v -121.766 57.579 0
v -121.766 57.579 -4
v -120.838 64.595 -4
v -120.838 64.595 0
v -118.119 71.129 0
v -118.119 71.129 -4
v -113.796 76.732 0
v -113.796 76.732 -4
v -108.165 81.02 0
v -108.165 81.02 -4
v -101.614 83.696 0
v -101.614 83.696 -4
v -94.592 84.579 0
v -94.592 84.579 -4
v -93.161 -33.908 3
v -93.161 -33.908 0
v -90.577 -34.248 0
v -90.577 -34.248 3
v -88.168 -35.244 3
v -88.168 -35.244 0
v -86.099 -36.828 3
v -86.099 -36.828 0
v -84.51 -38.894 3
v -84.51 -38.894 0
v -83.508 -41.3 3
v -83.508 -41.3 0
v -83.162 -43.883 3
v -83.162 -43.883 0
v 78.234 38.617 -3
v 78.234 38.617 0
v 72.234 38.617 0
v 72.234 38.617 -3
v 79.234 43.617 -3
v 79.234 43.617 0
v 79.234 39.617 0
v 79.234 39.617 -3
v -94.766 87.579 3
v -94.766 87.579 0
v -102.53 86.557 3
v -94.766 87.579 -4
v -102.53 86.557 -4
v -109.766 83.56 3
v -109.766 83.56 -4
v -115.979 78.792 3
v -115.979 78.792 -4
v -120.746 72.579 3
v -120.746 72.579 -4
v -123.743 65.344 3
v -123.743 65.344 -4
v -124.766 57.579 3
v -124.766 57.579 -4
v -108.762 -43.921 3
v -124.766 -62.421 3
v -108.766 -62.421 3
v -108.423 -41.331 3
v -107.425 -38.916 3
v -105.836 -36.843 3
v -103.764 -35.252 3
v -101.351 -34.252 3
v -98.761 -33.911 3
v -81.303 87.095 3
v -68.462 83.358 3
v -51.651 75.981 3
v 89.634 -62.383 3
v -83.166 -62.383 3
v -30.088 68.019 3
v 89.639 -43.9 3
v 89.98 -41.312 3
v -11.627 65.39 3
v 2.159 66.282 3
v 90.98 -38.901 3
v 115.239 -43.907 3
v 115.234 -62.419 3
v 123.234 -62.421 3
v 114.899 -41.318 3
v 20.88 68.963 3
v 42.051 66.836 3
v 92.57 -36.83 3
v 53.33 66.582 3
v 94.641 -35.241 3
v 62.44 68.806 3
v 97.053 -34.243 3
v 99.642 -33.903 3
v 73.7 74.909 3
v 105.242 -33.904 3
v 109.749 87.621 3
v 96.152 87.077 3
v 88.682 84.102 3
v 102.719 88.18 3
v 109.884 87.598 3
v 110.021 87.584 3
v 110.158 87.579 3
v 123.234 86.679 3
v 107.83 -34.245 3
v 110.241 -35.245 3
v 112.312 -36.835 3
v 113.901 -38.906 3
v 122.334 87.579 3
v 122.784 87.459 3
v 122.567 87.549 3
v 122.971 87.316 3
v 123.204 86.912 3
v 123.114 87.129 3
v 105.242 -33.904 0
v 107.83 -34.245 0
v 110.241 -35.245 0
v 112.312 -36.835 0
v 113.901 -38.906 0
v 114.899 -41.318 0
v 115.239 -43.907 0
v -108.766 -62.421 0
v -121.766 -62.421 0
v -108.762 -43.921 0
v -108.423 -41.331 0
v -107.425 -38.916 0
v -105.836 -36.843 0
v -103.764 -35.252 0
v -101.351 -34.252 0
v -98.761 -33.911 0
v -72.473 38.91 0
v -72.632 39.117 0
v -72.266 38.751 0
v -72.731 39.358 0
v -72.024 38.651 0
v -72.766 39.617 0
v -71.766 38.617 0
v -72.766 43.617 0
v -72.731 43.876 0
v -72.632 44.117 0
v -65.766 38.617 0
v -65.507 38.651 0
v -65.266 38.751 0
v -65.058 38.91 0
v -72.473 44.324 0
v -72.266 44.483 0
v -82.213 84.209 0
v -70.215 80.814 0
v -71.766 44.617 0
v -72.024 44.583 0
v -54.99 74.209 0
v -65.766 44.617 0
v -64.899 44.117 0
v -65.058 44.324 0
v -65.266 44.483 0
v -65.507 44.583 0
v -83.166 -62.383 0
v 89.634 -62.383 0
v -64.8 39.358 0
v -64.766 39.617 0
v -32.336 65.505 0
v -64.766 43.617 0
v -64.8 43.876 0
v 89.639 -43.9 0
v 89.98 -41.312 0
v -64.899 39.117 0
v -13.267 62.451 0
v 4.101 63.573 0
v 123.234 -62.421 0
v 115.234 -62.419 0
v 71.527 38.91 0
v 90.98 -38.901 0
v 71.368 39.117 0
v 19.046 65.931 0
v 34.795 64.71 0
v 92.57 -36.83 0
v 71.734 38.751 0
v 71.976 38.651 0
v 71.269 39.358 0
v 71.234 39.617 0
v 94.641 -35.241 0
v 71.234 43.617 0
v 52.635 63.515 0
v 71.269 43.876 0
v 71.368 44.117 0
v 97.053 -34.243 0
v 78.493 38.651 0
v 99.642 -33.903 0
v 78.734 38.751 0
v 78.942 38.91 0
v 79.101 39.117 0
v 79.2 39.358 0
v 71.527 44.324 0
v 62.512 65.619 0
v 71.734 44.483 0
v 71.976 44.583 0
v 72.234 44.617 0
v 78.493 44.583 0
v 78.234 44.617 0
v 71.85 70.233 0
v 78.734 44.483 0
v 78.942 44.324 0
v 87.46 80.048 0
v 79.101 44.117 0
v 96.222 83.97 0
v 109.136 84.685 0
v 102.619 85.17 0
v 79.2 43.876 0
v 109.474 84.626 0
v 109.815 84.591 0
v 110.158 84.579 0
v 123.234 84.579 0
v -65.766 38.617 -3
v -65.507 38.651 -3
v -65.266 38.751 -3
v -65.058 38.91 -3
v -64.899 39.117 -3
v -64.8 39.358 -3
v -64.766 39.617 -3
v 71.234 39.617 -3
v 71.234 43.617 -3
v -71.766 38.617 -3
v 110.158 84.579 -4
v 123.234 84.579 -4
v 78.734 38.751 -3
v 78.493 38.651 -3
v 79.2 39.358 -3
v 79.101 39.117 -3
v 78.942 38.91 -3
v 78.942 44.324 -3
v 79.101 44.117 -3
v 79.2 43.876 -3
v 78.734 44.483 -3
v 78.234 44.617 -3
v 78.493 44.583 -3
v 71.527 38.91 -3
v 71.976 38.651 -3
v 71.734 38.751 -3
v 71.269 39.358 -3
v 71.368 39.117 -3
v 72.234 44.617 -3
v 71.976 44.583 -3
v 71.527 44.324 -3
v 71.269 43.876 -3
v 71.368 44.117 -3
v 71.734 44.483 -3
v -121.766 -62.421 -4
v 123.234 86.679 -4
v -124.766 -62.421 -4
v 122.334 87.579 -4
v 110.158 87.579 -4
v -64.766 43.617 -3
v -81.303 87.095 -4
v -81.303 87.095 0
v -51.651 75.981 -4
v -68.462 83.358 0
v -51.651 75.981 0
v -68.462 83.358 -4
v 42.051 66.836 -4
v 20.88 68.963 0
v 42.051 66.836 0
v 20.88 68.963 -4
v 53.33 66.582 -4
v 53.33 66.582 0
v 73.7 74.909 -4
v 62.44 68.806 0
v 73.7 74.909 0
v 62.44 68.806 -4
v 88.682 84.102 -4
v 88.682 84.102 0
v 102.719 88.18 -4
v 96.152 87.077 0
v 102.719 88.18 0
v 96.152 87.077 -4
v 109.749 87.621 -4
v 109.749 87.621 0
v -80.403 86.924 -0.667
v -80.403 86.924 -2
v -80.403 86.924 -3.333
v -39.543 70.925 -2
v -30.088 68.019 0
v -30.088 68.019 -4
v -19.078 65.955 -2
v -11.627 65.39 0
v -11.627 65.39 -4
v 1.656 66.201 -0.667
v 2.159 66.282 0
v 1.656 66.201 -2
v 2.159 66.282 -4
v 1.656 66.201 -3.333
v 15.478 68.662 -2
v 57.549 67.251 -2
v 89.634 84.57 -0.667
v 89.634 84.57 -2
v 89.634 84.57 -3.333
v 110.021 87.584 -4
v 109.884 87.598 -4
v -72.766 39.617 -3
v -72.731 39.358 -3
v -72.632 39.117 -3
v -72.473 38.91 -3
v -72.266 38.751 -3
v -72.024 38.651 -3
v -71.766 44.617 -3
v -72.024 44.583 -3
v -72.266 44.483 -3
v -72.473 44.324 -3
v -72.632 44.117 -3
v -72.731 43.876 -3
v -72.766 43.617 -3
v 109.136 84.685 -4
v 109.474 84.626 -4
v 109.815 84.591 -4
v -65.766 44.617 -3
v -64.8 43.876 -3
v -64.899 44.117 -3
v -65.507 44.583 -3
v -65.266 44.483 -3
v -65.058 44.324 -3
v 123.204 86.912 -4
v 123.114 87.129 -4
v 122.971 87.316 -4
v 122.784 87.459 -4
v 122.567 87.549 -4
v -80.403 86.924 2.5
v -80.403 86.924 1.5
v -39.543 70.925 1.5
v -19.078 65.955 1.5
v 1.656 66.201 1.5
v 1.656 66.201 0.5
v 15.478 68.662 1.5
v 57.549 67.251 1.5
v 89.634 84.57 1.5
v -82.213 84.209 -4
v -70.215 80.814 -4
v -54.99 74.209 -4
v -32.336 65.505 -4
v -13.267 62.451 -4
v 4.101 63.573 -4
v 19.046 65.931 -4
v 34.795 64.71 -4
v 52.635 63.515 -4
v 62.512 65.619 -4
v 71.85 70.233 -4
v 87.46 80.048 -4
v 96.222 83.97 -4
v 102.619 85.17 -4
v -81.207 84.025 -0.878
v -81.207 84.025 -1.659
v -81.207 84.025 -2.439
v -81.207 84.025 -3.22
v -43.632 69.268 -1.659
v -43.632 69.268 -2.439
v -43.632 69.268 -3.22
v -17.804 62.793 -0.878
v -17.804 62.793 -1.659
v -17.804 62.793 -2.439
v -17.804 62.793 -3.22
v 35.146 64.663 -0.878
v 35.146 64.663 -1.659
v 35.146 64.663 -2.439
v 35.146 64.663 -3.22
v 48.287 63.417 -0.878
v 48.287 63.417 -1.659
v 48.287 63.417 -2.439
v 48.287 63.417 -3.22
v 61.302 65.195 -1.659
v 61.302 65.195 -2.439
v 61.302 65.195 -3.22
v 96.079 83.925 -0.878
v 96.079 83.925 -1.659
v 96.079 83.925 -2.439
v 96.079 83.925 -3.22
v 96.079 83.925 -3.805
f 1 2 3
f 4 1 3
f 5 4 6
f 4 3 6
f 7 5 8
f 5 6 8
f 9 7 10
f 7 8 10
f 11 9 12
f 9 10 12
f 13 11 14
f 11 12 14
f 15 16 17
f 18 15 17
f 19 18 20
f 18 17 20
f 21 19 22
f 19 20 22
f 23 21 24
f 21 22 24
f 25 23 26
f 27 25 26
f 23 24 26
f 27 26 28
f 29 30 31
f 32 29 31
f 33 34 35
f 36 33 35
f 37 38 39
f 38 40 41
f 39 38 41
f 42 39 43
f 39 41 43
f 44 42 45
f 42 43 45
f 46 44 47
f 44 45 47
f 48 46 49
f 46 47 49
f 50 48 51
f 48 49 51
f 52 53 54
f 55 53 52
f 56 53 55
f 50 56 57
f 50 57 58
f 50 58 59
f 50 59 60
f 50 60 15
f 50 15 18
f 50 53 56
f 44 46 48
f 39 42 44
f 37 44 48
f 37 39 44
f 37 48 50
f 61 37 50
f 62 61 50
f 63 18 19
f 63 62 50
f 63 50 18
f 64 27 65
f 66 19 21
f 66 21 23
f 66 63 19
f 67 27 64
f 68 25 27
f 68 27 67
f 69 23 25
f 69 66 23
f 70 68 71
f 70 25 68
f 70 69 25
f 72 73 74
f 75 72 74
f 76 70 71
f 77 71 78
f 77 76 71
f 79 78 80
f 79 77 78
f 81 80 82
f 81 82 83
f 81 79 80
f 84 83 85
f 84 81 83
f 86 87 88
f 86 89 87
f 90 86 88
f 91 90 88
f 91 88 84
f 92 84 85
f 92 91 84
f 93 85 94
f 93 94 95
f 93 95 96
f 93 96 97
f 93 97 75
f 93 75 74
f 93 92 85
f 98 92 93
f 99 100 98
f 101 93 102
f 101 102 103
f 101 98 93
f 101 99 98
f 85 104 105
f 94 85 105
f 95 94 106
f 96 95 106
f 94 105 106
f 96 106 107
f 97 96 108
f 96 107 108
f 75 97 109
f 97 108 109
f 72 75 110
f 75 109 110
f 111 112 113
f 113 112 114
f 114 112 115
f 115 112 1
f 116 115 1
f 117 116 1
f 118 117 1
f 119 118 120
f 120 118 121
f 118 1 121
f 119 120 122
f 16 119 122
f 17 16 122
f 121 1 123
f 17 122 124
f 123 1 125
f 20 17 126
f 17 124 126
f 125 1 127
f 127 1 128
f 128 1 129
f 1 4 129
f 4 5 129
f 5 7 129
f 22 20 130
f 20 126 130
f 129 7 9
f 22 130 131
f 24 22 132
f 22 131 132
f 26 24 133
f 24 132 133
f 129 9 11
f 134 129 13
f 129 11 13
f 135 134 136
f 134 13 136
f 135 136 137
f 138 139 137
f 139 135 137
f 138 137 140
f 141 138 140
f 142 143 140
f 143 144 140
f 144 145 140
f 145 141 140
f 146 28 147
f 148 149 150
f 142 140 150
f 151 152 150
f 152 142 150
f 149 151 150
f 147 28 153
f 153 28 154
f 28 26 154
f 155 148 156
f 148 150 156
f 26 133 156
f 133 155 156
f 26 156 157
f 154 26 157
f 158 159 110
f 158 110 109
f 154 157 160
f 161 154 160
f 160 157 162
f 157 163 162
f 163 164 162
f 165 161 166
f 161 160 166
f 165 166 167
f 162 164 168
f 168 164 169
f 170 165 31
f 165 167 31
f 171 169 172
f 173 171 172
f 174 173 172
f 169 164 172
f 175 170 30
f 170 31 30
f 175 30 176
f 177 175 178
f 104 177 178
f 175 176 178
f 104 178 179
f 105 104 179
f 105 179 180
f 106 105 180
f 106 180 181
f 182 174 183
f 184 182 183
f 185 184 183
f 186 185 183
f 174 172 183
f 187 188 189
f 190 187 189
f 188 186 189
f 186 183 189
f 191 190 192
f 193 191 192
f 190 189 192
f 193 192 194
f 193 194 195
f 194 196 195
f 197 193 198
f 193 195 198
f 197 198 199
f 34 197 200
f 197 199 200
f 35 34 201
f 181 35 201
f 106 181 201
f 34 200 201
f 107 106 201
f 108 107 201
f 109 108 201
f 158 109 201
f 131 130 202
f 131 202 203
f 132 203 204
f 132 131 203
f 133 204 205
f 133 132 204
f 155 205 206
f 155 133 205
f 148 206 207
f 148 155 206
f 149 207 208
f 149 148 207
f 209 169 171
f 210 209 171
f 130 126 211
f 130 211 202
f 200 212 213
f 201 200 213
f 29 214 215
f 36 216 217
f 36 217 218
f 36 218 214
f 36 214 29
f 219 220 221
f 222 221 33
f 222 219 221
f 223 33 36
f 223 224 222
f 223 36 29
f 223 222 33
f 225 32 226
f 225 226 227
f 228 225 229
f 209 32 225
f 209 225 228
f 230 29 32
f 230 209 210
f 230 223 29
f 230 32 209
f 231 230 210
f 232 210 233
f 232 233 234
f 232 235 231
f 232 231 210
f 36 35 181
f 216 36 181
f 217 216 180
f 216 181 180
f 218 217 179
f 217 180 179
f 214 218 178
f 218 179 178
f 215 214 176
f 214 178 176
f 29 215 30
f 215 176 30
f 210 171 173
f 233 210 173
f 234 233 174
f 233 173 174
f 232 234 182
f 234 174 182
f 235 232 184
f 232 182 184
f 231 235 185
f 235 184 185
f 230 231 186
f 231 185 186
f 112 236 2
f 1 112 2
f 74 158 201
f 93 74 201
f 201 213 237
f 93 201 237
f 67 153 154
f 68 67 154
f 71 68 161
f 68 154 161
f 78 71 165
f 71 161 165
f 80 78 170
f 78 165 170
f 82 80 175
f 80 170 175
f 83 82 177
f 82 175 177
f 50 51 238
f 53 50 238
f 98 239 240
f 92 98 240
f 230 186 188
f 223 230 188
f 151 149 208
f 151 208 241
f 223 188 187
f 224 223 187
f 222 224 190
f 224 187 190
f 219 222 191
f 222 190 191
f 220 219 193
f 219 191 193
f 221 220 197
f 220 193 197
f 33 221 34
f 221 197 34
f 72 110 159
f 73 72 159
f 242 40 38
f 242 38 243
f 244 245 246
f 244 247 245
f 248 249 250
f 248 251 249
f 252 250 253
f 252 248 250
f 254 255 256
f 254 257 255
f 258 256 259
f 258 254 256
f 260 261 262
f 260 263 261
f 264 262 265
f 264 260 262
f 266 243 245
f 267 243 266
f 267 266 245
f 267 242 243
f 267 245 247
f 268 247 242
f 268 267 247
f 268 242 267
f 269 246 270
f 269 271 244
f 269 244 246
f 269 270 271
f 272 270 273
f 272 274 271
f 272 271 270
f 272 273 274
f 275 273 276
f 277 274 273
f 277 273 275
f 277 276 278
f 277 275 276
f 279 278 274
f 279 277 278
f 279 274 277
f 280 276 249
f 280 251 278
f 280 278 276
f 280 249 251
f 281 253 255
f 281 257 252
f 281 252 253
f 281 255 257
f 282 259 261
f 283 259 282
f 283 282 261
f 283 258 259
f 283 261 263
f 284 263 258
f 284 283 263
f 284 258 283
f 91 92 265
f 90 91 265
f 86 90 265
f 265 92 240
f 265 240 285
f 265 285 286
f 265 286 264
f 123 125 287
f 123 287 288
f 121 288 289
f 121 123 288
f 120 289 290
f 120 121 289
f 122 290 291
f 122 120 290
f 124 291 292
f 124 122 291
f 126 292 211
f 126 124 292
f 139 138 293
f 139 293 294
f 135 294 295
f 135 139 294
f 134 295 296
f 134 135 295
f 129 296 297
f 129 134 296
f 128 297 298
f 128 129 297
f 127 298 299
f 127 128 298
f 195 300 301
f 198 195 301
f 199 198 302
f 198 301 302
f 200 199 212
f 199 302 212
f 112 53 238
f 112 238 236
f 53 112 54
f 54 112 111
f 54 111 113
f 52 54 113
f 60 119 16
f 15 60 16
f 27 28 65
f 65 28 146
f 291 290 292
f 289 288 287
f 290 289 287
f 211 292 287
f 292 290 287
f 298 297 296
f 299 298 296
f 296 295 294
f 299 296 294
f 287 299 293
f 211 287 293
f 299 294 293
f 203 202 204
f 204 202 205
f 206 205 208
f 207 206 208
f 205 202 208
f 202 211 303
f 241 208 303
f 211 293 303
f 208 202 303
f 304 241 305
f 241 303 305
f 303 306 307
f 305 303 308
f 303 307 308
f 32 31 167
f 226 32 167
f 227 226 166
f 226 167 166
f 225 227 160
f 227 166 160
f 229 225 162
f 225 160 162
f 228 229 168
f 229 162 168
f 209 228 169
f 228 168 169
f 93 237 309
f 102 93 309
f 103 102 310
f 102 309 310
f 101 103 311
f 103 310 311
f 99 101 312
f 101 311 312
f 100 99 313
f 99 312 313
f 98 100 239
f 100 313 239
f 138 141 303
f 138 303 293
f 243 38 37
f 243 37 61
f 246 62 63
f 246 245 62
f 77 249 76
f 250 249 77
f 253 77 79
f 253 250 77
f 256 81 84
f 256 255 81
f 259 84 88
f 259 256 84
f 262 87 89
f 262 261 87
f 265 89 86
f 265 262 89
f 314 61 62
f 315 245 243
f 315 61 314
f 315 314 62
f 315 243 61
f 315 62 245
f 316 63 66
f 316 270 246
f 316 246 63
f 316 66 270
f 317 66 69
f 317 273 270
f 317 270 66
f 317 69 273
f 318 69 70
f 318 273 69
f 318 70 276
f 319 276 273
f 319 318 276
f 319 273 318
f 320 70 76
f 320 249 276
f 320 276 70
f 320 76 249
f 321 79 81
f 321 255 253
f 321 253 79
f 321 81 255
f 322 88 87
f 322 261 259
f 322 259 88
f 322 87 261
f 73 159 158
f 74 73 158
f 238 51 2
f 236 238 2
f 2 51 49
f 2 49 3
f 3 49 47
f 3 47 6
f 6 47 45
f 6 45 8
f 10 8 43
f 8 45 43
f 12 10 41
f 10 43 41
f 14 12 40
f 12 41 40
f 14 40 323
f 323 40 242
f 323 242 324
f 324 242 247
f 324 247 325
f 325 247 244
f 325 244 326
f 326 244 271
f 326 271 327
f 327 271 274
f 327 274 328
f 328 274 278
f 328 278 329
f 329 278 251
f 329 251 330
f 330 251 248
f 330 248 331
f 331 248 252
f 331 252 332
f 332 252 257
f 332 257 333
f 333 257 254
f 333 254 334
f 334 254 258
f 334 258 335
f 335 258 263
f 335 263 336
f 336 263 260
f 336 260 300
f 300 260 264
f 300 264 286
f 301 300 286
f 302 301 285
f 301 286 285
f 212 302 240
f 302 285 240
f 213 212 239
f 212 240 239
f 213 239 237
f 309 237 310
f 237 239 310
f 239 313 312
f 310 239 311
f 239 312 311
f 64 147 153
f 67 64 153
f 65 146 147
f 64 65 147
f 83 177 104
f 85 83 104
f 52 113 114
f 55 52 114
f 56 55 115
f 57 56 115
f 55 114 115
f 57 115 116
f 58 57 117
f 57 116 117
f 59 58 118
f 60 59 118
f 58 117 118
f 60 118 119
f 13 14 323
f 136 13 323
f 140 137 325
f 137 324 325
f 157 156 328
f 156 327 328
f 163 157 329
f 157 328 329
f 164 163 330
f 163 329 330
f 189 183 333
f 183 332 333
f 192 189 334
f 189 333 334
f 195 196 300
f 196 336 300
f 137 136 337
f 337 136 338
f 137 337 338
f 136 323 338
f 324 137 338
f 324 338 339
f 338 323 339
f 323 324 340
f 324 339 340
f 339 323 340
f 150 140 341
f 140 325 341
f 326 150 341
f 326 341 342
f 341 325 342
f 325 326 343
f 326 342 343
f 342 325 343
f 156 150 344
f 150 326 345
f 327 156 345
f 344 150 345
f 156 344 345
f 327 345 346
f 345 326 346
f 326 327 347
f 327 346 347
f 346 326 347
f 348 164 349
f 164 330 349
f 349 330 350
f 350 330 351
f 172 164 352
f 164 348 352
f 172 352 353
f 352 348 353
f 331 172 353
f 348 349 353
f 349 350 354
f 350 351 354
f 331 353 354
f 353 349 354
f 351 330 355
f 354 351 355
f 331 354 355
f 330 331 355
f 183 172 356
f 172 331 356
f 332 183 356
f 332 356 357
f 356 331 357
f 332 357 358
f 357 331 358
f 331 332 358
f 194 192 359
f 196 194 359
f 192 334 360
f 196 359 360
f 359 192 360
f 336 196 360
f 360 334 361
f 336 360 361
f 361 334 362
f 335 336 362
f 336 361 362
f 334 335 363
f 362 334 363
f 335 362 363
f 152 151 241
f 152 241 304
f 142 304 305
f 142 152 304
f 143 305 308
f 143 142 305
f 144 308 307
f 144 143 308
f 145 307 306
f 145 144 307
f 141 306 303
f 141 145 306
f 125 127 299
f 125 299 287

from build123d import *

# Parameters (mm, degrees)
BOSS_EXTRUDE1_DEPTH = 3
BOSS_EXTRUDE2_DEPTH = 3
BOSS_EXTRUDE5_START = 4
BOSS_EXTRUDE5_DEPTH = 4


with BuildPart() as part:
    # Sketch1 → Boss-Extrude1 (new body)
    with BuildSketch(Plane.XY):
        with BuildLine():
            Line((-124.765521303, -62.420756715), (-108.765521303, -62.420756715))
            Line((-108.765521303, -62.420756715), (-108.761709468, -43.920757107))
            ThreePointArc((-108.761709468, -43.920757107), (-105.835782296, -36.843166813), (-98.760678208, -33.911232925))
            Line((-98.760678208, -33.911232925), (-93.160679046, -33.908168006))
            ThreePointArc((-93.160679046, -33.908168006), (-86.099239047, -36.828472645), (-83.161701095, -43.882761045))
            Line((-83.161701095, -43.882761045), (-83.165512931, -62.382760652))
            Line((-83.165512931, -62.382760652), (89.634487069, -62.382760652))
            Line((89.634487069, -62.382760652), (89.639059879, -43.900228298))
            ThreePointArc((89.639059879, -43.900228298), (92.569741149, -36.829885233), (99.641533275, -33.902702306))
            Line((99.641533275, -33.902702306), (105.241533104, -33.904087579))
            ThreePointArc((105.241533104, -33.904087579), (112.311876169, -36.834768849), (115.239059096, -43.906560975))
            Line((115.239059096, -43.906560975), (115.234478942, -62.418777415))
            Line((115.234478942, -62.418777415), (123.234478697, -62.420756715))
            Line((123.234478697, -62.420756715), (123.234478697, 86.679243285))
            ThreePointArc((123.234478697, 86.679243285), (122.9708748, 87.315639388), (122.334478697, 87.579243285))
            Line((122.334478697, 87.579243285), (110.157919421, 87.579243285))
            ThreePointArc((110.157919421, 87.579243285), (109.9524496, 87.589825744), (109.749154155, 87.621461133))
            add(Edge.make_bspline(
                [(-94.765521303, 87.579243285), (-74.957455301, 89.940177419), (-46.2376476, 68.954253783), (-6.60073203, 63.299190552), (25.004355226, 72.030705776), (58.016388628, 59.38666161), (84.058797825, 84.553468887), (102.329172258, 89.170678891), (109.749154155, 87.621461133)],
                knots=[0, 0, 0, 0, 0.273591438, 0.468641213, 0.542501715, 0.732723471, 0.90422006, 0.999913238, 0.999913238, 0.999913238, 0.999913238], degree=3))
            ThreePointArc((-94.765521303, 87.579243285), (-115.978724739, 78.792446721), (-124.765521303, 57.579243285))
            Line((-124.765521303, 57.579243285), (-124.765521303, -62.420756715))
        make_face()
    extrude(amount=BOSS_EXTRUDE1_DEPTH)

    # Sketch2 → Boss-Extrude2 (add)
    with BuildSketch(Plane(origin=(0, 0, 0), x_dir=(-1, 0, 0), z_dir=(0, 0, -1))):
        with BuildLine():
            Line((65.765521304, 44.617239348), (71.765521304, 44.617239348))
            ThreePointArc((71.765521304, 44.617239348), (72.472628085, 44.324346129), (72.765521304, 43.617239348))
            Line((72.765521304, 43.617239348), (72.765521304, 39.617239348))
            ThreePointArc((72.765521304, 39.617239348), (72.472628085, 38.910132567), (71.765521304, 38.617239348))
            Line((71.765521304, 38.617239348), (65.765521304, 38.617239348))
            ThreePointArc((65.765521304, 38.617239348), (65.058414523, 38.910132567), (64.765521304, 39.617239348))
            Line((64.765521304, 39.617239348), (64.765521304, 43.617239348))
            ThreePointArc((64.765521304, 43.617239348), (65.058414523, 44.324346129), (65.765521304, 44.617239348))
        make_face()
        with BuildLine():
            Line((-79.234478696, 43.617239348), (-79.234478696, 39.617239348))
            ThreePointArc((-79.234478696, 39.617239348), (-78.941585477, 38.910132567), (-78.234478696, 38.617239348))
            Line((-78.234478696, 38.617239348), (-72.234478696, 38.617239348))
            ThreePointArc((-72.234478696, 38.617239348), (-71.527371915, 38.910132567), (-71.234478696, 39.617239348))
            Line((-71.234478696, 39.617239348), (-71.234478696, 43.617239348))
            ThreePointArc((-71.234478696, 43.617239348), (-71.527371915, 44.324346129), (-72.234478696, 44.617239348))
            Line((-72.234478696, 44.617239348), (-78.234478696, 44.617239348))
            ThreePointArc((-78.234478696, 44.617239348), (-78.941585477, 44.324346129), (-79.234478696, 43.617239348))
        make_face()
    extrude(amount=BOSS_EXTRUDE2_DEPTH)

    # Sketch3 → Boss-Extrude5 (add)
    with BuildSketch(Plane(origin=(0, 0, 0), x_dir=(-1, 0, 0), z_dir=(0, 0, -1)).offset(BOSS_EXTRUDE5_START)):
        with BuildLine():
            Line((-110.157919421, 84.579243285), (-120.234478697, 84.579243285))
            Line((-120.234478697, 84.579243285), (-123.234478697, 84.579243285))
            Line((-123.234478697, 84.579243285), (-123.234478697, 86.679243285))
            ThreePointArc((-123.234478697, 86.679243285), (-122.9708748, 87.315639388), (-122.334478697, 87.579243285))
            Line((-122.334478697, 87.579243285), (-110.157919421, 87.579243285))
            ThreePointArc((-110.157919421, 87.579243285), (-109.9524496, 87.589825744), (-109.749154155, 87.621461133))
            add(Edge.make_bspline(
                [(94.765521303, 87.579243285), (74.957455301, 89.940177419), (46.2376476, 68.954253783), (6.60073203, 63.299190552), (-25.004355226, 72.030705776), (-58.016388628, 59.38666161), (-84.058797825, 84.553468887), (-102.329172258, 89.170678891), (-109.749154155, 87.621461133)],
                knots=[0, 0, 0, 0, 0.273591438, 0.468641213, 0.542501715, 0.732723471, 0.90422006, 0.999913238, 0.999913238, 0.999913238, 0.999913238], degree=3))
            ThreePointArc((94.765521303, 87.579243285), (115.978724739, 78.792446721), (124.765521303, 57.579243285))
            Line((124.765521303, 57.579243285), (124.765521303, -62.420756715))
            Line((124.765521303, -62.420756715), (121.765521303, -62.420756715))
            Line((121.765521303, -62.420756715), (121.765521303, -59.420756715))
            Line((121.765521303, -59.420756715), (121.765521303, 57.579243285))
            ThreePointArc((121.765521303, 57.579243285), (113.795971322, 76.732362407), (94.59204189, 84.578685963))
            add(Edge.make_bspline(
                [(94.59204189, 84.578685963), (94.027334184, 84.64599378), (93.463219473, 84.705649858), (92.33724846, 84.795820483), (91.77521646, 84.828602168), (90.091898927, 84.891095083), (88.973394431, 84.884921011), (85.628249078, 84.732612919), (83.412006817, 84.452299932), (80.104755866, 83.811018944), (79.004932212, 83.560498553), (76.81129283, 82.995255315), (75.726580156, 82.682972493), (72.502043825, 81.673602297), (70.391652345, 80.904408494), (64.132156627, 78.421220067), (60.053549302, 76.534513761), (53.92897583, 73.720776846), (51.886718133, 72.784660837), (47.778947181, 70.969403035), (45.712268016, 70.0898512), (41.552372793, 68.445936347), (39.45707394, 67.683836563), (35.228985166, 66.305822351), (33.09695122, 65.686960226), (26.644351427, 64.050670969), (22.267885847, 63.251208359), (16.687800606, 62.678855788), (15.56383119, 62.585786287), (13.316785567, 62.445817879), (12.195290199, 62.398906989), (8.836993911, 62.328617547), (6.606372824, 62.375568599), (2.162421001, 62.666243548), (-0.050907189, 62.909996442), (-4.459148919, 63.607070175), (-6.654100587, 64.059957097), (-11.046425878, 64.938167897), (-13.245132, 65.362789293), (-16.538268215, 65.77297774), (-17.635353088, 65.868973619), (-19.828079765, 65.967244496), (-20.923786317, 65.973724718), (-24.209426682, 65.89709212), (-26.39789394, 65.718733271), (-30.773067437, 65.247645537), (-32.959763596, 64.954261923), (-37.333234472, 64.372596755), (-39.519858855, 64.083857412), (-43.898365974, 63.627871621), (-46.090160722, 63.460155549), (-49.38572835, 63.395387974), (-50.485568825, 63.405060058), (-52.137888511, 63.480266867), (-52.689088889, 63.515467765), (-53.792450439, 63.608659511), (-54.345911147, 63.666824331), (-55.998354384, 63.878302139), (-57.083809169, 64.067722381), (-59.2187587, 64.554249363), (-60.268195866, 64.851528536), (-63.370586667, 65.880880898), (-65.377672236, 66.750311325), (-68.327608131, 68.236207558), (-69.301343918, 68.76226389), (-71.220369253, 69.851967823), (-72.167683568, 70.4165874), (-76.864268772, 73.304483807), (-80.493101442, 75.822932572), (-85.182631647, 78.722261709), (-86.128348858, 79.289469419), (-88.044651029, 80.383586278), (-89.01455999, 80.910026033), (-91.960518496, 82.3952214), (-93.975984432, 83.263721559), (-97.130652753, 84.255935405), (-98.208454188, 84.534590379), (-100.366809822, 84.953643768), (-101.452349087, 85.09598358), (-103.63727797, 85.234381715), (-104.736668827, 85.230426953), (-106.950020265, 85.068638259), (-108.048805247, 84.911784564), (-109.136006255, 84.684787904)],
                knots=[0, 0, 0, 0, 0.0078125, 0.0078125, 0.015625, 0.015625, 0.03125, 0.03125, 0.0625, 0.0625, 0.078125, 0.078125, 0.09375, 0.09375, 0.125, 0.125, 0.1875, 0.1875, 0.21875, 0.21875, 0.25, 0.25, 0.28125, 0.28125, 0.3125, 0.3125, 0.375, 0.375, 0.390625, 0.390625, 0.40625, 0.40625, 0.4375, 0.4375, 0.46875, 0.46875, 0.5, 0.5, 0.53125, 0.53125, 0.546875, 0.546875, 0.5625, 0.5625, 0.59375, 0.59375, 0.625, 0.625, 0.65625, 0.65625, 0.6875, 0.6875, 0.703125, 0.703125, 0.7109375, 0.7109375, 0.71875, 0.71875, 0.734375, 0.734375, 0.75, 0.75, 0.78125, 0.78125, 0.796875, 0.796875, 0.8125, 0.8125, 0.875, 0.875, 0.890625, 0.890625, 0.90625, 0.90625, 0.9375, 0.9375, 0.953125, 0.953125, 0.96875, 0.96875, 0.984375, 0.984375, 1, 1, 1, 1], degree=3))
            ThreePointArc((-109.136006255, 84.684787904), (-109.644244868, 84.605699433), (-110.157919421, 84.579243285))
        make_face()
    extrude(amount=-BOSS_EXTRUDE5_DEPTH)


solid = part.part
